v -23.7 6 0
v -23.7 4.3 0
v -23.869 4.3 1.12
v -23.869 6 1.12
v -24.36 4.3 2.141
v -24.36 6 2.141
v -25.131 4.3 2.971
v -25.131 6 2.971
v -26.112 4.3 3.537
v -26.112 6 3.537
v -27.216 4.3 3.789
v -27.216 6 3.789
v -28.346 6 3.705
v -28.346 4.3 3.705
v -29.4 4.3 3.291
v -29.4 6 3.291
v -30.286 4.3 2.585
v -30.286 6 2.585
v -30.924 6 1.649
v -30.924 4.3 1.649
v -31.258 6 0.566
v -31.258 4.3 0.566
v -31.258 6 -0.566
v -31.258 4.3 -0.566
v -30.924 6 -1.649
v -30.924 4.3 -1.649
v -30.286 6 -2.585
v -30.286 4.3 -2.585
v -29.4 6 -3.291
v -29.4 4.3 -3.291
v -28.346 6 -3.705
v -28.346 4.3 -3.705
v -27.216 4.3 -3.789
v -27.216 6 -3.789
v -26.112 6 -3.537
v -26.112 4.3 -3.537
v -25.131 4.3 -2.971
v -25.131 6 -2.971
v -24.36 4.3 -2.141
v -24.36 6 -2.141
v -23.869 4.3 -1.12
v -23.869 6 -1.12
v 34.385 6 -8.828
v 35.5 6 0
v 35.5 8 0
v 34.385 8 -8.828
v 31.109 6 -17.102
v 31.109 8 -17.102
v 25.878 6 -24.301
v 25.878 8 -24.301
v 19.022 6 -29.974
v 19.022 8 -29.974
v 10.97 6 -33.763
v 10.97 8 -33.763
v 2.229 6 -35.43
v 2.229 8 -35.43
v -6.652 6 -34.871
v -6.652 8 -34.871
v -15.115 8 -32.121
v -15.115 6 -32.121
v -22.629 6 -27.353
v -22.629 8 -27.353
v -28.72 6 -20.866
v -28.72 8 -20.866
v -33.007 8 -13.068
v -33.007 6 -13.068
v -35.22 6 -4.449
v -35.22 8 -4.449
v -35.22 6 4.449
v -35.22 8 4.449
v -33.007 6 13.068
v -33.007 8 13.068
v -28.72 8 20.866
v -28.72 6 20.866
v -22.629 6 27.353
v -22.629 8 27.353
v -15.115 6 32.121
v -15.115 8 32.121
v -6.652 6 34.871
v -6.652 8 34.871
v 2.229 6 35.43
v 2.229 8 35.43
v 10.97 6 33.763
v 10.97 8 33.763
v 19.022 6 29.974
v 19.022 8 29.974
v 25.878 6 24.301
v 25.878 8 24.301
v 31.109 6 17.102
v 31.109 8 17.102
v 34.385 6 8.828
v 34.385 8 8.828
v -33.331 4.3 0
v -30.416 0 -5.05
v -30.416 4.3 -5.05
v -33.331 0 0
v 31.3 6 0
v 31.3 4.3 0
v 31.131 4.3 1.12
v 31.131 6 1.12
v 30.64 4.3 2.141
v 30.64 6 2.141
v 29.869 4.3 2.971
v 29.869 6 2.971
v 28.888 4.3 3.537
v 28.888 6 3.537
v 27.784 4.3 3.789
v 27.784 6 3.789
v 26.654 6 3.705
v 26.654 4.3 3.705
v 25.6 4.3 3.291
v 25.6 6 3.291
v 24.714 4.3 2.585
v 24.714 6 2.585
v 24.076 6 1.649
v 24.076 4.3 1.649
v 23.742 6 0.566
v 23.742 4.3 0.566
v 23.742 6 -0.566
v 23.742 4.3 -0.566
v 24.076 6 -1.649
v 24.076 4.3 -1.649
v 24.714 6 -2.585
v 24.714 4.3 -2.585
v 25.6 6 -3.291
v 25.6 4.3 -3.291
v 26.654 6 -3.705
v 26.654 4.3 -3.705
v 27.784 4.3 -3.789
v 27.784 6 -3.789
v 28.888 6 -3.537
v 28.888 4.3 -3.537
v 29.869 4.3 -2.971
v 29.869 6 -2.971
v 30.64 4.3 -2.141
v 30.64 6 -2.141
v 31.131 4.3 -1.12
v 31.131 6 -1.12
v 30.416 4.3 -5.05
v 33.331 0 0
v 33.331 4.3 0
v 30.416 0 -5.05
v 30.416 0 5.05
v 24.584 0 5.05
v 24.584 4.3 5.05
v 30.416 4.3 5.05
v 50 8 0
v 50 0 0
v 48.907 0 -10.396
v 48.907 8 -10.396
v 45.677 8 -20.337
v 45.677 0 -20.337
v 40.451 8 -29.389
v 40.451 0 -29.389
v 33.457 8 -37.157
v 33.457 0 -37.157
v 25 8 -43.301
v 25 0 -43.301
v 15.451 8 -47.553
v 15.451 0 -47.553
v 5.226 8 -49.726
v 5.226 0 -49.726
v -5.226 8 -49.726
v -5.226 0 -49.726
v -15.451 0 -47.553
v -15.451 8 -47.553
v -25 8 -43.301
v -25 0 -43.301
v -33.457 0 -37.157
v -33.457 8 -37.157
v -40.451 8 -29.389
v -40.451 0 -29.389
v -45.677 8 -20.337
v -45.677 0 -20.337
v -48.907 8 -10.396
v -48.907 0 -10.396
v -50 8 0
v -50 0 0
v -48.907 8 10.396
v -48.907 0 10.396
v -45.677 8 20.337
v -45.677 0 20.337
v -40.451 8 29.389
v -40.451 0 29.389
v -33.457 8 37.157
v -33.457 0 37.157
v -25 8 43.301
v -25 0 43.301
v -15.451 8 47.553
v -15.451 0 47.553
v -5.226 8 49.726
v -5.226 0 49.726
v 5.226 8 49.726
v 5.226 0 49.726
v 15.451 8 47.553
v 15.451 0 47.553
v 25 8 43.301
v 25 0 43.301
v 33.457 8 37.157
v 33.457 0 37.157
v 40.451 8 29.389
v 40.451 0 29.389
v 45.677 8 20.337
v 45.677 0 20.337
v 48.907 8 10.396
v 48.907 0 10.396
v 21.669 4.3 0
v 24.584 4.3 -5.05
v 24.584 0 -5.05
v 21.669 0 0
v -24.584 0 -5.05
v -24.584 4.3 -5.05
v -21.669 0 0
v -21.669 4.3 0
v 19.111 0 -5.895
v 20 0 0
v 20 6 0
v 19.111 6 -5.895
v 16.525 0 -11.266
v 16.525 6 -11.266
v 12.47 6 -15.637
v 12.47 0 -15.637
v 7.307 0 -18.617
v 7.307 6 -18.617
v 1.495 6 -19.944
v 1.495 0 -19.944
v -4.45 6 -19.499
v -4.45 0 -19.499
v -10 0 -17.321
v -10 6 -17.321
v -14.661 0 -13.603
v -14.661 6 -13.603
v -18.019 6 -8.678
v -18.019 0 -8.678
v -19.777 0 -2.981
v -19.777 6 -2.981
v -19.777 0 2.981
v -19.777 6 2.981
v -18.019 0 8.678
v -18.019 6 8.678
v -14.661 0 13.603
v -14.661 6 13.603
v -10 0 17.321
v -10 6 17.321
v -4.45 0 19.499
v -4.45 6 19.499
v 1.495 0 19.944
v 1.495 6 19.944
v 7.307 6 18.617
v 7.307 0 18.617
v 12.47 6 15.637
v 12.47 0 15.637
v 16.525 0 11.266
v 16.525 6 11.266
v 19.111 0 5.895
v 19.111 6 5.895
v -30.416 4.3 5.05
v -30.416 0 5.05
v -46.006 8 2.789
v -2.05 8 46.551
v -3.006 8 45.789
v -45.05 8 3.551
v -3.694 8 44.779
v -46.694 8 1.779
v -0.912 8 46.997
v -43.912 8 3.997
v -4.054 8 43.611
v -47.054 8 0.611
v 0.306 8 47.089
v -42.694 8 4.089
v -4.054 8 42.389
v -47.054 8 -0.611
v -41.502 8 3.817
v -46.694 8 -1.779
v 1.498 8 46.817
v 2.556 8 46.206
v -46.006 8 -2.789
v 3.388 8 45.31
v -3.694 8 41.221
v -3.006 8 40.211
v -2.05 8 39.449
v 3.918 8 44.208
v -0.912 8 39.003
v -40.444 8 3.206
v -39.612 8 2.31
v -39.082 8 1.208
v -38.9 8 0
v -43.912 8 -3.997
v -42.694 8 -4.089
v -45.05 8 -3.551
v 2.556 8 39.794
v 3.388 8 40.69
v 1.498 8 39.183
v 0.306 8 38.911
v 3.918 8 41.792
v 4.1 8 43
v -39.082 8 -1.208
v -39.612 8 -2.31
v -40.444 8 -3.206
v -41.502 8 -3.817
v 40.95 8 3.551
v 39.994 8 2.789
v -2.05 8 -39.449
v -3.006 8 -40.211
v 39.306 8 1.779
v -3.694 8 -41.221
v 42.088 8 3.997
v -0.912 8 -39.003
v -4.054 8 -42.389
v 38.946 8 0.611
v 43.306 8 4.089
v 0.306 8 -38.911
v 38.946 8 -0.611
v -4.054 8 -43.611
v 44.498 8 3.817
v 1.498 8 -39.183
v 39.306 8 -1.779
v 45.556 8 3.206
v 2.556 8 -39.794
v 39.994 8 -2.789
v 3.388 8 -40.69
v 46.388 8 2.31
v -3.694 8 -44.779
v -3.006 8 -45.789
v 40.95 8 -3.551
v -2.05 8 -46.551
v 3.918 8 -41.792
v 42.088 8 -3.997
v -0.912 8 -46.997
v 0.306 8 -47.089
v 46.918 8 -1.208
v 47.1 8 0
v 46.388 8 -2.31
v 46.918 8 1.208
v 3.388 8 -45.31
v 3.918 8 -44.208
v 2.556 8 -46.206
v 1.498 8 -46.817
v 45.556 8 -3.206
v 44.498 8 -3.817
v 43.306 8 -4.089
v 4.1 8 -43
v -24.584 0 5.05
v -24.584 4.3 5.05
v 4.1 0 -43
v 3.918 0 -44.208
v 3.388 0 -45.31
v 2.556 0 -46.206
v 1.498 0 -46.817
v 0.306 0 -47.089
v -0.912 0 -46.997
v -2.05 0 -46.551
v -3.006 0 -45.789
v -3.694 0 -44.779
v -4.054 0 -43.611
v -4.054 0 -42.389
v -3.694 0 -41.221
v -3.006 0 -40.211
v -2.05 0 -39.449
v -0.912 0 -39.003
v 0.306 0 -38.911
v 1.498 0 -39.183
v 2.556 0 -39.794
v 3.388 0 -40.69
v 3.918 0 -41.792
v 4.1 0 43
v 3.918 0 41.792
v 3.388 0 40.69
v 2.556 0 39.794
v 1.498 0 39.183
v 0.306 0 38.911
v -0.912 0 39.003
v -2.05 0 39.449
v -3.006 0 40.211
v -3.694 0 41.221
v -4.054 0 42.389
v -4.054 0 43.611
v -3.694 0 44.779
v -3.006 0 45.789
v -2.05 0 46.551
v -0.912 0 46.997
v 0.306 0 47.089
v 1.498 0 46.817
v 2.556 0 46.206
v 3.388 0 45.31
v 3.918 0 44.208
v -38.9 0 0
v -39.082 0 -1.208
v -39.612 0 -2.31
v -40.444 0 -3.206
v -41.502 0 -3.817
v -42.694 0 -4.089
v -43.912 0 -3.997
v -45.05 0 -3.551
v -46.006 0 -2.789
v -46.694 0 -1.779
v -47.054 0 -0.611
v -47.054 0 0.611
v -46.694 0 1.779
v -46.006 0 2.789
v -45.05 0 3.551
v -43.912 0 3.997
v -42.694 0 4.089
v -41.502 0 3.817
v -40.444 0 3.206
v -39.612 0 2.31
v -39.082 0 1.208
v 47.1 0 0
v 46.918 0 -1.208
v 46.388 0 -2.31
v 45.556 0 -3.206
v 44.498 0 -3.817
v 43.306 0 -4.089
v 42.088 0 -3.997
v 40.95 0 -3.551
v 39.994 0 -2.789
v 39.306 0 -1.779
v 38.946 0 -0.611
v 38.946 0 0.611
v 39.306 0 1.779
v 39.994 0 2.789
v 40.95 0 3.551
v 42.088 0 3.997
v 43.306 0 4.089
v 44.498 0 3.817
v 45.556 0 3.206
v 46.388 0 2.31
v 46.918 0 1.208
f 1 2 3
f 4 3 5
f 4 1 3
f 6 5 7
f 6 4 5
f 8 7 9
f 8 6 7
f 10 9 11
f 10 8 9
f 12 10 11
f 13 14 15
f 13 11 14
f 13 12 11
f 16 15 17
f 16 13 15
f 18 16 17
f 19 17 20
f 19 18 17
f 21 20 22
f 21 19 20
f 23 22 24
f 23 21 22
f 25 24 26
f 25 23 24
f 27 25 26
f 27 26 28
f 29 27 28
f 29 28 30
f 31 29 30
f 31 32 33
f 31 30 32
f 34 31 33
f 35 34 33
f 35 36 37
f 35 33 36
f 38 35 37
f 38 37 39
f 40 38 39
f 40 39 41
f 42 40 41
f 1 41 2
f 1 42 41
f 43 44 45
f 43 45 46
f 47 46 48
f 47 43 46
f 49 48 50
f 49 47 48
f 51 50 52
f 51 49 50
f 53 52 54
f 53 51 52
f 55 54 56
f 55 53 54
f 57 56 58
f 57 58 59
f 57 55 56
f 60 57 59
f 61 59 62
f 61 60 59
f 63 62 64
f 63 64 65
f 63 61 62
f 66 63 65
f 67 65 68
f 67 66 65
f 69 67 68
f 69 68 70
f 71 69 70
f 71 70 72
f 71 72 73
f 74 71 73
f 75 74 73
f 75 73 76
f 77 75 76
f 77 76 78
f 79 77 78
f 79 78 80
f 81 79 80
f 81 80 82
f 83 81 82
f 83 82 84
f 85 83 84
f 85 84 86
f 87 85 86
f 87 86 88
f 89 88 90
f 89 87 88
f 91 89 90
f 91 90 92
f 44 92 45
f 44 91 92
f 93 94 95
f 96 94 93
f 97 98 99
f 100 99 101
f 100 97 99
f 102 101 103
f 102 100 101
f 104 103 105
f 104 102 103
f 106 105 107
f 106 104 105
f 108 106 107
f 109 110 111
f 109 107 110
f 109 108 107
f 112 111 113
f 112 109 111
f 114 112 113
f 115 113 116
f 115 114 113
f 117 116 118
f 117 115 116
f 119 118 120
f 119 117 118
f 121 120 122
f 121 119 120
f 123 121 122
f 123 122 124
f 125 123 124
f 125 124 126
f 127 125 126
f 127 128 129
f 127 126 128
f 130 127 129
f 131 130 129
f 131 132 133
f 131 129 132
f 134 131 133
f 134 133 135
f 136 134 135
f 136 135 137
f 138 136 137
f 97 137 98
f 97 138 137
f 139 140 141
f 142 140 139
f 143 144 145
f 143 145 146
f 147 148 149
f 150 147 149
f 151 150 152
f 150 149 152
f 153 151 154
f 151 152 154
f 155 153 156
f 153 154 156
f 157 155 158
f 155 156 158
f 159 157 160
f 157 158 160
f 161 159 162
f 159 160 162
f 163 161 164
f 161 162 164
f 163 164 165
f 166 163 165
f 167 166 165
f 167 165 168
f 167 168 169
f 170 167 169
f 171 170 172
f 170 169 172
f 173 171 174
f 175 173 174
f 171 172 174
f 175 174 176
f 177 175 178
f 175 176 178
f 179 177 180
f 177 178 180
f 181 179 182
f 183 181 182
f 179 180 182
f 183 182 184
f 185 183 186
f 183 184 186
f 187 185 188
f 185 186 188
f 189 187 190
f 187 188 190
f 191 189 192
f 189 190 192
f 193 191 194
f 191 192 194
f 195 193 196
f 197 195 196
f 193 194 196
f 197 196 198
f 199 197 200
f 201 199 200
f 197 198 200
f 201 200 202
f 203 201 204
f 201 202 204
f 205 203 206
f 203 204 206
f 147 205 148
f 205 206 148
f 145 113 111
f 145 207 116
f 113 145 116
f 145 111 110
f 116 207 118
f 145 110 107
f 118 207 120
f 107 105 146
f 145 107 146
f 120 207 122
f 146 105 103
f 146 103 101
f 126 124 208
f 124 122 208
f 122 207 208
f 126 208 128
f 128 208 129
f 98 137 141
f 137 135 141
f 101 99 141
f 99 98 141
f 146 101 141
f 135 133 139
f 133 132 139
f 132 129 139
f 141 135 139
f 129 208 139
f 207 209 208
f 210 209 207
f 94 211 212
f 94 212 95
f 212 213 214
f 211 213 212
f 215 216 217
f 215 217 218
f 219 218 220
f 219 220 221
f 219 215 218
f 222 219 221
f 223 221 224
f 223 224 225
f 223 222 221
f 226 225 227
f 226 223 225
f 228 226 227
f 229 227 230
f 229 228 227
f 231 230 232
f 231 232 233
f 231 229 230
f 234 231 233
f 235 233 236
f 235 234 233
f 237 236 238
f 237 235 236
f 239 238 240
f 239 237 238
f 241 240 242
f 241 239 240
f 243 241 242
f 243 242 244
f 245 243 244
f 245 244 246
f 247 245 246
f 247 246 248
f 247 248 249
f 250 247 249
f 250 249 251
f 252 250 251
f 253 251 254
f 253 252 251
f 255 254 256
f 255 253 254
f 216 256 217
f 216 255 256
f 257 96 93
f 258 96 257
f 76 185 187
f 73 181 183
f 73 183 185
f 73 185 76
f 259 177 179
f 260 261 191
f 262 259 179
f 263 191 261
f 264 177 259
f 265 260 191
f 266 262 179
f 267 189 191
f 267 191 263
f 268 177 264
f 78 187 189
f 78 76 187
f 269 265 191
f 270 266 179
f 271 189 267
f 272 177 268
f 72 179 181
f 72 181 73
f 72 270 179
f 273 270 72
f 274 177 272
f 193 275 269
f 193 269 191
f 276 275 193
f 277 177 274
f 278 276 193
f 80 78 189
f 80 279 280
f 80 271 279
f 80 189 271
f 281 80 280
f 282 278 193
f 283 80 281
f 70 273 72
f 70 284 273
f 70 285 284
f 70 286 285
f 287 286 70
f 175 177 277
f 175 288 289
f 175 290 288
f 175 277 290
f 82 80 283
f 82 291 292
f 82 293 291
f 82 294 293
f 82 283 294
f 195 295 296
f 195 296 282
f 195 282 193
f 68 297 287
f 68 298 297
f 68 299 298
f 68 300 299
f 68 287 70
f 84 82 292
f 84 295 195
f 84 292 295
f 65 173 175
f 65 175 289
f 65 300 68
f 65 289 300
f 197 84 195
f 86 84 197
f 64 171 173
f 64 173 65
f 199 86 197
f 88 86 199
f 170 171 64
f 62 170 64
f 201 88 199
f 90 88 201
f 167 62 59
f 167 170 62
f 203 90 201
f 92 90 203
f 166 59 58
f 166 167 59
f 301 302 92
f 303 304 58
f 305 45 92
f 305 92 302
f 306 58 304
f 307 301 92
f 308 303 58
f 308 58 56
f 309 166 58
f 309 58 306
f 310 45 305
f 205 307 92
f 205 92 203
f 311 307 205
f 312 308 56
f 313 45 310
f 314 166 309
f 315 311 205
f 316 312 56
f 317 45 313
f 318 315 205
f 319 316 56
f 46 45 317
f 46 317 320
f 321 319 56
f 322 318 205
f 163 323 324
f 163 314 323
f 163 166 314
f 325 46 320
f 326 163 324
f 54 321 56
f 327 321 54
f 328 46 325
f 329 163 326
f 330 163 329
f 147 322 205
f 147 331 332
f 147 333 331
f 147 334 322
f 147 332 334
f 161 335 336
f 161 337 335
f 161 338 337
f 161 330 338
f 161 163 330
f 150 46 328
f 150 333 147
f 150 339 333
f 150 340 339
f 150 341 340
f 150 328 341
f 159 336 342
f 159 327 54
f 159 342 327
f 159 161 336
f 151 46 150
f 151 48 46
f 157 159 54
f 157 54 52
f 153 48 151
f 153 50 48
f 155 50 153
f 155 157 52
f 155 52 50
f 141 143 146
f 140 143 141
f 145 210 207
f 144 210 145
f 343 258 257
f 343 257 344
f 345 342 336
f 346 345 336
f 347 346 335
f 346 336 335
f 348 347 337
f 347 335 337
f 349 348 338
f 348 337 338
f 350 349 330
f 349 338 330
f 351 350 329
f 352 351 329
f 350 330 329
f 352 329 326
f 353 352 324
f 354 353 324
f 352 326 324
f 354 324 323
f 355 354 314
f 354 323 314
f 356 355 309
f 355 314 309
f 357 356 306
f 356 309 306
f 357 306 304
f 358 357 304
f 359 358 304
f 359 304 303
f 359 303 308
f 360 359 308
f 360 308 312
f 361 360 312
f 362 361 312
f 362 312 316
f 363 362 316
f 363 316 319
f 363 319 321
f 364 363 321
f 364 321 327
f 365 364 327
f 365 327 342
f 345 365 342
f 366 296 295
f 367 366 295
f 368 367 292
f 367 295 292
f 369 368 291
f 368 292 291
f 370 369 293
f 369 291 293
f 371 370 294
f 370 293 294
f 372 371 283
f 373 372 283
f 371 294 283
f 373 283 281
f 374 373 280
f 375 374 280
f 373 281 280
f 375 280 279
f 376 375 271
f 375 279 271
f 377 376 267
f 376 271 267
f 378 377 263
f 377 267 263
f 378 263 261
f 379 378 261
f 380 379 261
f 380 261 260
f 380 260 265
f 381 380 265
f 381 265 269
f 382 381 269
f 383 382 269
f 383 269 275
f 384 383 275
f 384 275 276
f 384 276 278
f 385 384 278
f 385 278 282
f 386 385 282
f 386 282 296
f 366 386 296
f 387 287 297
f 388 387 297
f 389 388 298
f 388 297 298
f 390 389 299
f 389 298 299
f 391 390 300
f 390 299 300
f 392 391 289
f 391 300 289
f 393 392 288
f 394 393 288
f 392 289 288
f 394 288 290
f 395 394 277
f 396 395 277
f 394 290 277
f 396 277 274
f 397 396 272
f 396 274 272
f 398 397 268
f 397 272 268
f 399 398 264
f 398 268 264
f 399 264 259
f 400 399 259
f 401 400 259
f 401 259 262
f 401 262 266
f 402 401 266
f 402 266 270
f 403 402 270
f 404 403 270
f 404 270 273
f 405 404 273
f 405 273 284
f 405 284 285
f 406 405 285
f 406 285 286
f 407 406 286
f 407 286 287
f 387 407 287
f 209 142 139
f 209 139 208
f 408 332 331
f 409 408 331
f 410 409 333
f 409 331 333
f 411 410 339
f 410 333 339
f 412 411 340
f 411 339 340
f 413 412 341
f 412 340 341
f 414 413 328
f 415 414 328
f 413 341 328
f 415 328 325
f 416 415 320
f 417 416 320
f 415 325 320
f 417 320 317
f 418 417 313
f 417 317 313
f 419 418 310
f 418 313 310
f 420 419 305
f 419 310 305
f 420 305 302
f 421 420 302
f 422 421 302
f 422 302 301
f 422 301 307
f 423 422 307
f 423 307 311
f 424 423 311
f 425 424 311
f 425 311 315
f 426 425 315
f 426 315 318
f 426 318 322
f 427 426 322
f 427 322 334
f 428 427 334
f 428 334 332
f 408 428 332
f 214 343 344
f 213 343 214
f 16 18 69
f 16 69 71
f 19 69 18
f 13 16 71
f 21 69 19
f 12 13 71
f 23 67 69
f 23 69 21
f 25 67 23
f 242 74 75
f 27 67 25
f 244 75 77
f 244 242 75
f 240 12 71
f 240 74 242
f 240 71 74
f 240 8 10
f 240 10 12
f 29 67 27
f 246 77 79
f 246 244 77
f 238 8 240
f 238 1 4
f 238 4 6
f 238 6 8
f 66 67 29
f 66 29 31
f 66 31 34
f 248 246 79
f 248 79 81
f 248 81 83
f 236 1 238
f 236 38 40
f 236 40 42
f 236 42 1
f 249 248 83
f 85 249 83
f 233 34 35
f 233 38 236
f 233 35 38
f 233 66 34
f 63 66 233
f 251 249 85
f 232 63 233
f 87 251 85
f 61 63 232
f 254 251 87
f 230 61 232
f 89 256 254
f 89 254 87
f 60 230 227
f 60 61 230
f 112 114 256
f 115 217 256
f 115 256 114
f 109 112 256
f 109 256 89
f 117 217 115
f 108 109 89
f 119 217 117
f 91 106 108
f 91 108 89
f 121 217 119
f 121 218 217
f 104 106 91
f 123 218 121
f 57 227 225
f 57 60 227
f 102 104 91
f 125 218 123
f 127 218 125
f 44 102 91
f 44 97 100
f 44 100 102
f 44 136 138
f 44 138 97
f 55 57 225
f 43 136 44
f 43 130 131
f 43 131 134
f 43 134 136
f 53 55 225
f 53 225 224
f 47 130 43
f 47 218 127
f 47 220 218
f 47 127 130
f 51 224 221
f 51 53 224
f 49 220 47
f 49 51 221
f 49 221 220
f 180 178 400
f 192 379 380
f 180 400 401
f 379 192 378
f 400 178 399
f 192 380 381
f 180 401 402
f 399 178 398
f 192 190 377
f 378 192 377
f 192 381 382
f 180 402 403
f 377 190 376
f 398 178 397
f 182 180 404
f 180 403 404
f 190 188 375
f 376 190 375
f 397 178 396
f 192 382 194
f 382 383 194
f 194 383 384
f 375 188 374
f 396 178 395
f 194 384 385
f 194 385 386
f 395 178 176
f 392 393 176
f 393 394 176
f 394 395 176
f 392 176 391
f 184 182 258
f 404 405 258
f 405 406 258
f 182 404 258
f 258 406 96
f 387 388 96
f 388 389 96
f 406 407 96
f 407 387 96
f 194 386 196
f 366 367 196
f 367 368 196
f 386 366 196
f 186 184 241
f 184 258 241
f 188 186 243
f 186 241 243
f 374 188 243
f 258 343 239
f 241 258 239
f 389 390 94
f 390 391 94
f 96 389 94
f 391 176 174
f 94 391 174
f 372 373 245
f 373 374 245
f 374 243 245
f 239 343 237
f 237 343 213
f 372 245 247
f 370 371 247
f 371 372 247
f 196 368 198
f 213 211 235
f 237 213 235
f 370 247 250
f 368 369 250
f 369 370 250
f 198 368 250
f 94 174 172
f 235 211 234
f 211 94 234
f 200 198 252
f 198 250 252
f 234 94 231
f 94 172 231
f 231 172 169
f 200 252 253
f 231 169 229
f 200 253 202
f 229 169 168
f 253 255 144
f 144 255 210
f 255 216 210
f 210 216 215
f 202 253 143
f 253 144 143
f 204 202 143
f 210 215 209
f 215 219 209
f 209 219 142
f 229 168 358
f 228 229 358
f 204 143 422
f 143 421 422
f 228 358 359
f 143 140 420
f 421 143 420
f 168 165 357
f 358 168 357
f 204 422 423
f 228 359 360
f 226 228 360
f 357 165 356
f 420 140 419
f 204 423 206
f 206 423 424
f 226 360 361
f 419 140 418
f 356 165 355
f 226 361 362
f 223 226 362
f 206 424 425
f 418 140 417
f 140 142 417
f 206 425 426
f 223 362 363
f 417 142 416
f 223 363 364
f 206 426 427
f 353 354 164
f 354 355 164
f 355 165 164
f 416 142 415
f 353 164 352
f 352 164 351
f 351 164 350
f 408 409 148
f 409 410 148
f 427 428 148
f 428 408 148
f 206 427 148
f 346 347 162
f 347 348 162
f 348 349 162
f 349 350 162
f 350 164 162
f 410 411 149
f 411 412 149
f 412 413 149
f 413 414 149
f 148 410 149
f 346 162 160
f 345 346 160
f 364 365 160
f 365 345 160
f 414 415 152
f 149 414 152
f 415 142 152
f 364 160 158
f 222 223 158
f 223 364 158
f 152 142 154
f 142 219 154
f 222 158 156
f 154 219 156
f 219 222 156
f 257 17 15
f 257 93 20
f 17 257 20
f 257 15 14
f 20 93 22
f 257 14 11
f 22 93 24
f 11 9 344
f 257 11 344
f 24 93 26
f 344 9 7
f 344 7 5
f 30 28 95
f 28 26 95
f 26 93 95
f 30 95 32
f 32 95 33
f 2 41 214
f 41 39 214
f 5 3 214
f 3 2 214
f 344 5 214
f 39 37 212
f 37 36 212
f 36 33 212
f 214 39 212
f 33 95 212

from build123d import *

# Parameters (mm, degrees)
SKETCH1_R               = 50
SKETCH1_R_2             = 35.5
BOSS_EXTRUDE1_DEPTH     = 8
SKETCH2_R               = 4.1
CUT_EXTRUDE1_DEPTH      = 1
CUT_EXTRUDE1_DEPTH_BACK = 9
SKETCH3_R               = 35.5
SKETCH3_R_2             = 20
BOSS_EXTRUDE2_DEPTH     = 6
CUT_EXTRUDE2_START      = -6
CUT_EXTRUDE2_DEPTH      = 4.3
SKETCH5_R               = 3.8
CUT_EXTRUDE3_DEPTH      = 7
CUT_EXTRUDE3_DEPTH_BACK = 3


with BuildPart() as part:
    # Sketch1 → Boss-Extrude1 (new body)
    with BuildSketch(Plane(origin=(0, 0, 0), x_dir=(1, 0, 0), z_dir=(0, 1, 0))):
        Circle(SKETCH1_R)
        Circle(SKETCH1_R_2, mode=Mode.SUBTRACT)
    extrude(amount=BOSS_EXTRUDE1_DEPTH)

    # Sketch2 → Cut-Extrude1 (cut, two sides)
    with BuildSketch(Plane(origin=(0, 8, 0), x_dir=(1, 0, 0), z_dir=(0, 1, 0))) as cut_extrude1_sk:
        with Locations((0, -43)):
            Circle(SKETCH2_R)
        with Locations((-43, 0)):
            Circle(SKETCH2_R)
        with Locations((0, 43)):
            Circle(SKETCH2_R)
        with Locations((43, 0)):
            Circle(SKETCH2_R)
    extrude(amount=CUT_EXTRUDE1_DEPTH, mode=Mode.SUBTRACT)
    extrude(cut_extrude1_sk.sketch, amount=-CUT_EXTRUDE1_DEPTH_BACK, mode=Mode.SUBTRACT)

    # Sketch3 → Boss-Extrude2 (add)
    with BuildSketch(Plane(origin=(0, 0, 0), x_dir=(1, 0, 0), z_dir=(0, 1, 0))):
        Circle(SKETCH3_R)
        Circle(SKETCH3_R_2, mode=Mode.SUBTRACT)
    extrude(amount=BOSS_EXTRUDE2_DEPTH)

    # Sketch4 → Cut-Extrude2 (cut)
    with BuildSketch(Plane(origin=(0, 6, 0), x_dir=(1, 0, 0), z_dir=(0, 1, 0)).offset(CUT_EXTRUDE2_START)):
        Polygon((-21.668762281, 0), (-24.584381141, 5.05), (-30.415618859, 5.05), (-33.331237719, 0), (-30.415618859, -5.05), (-24.584381141, -5.05), align=None)
        Polygon((33.331237719, 0), (30.415618859, 5.05), (24.584381141, 5.05), (21.668762281, 0), (24.584381141, -5.05), (30.415618859, -5.05), align=None)
    extrude(amount=CUT_EXTRUDE2_DEPTH, mode=Mode.SUBTRACT)

    # Sketch5 → Cut-Extrude3 (cut, two sides)
    with BuildSketch(Plane(origin=(0, 6, -6), x_dir=(1, 0, 0), z_dir=(0, -1, 0))) as cut_extrude3_sk:
        with Locations((-27.5, 6)):
            Circle(SKETCH5_R)
        with Locations((27.5, 6)):
            Circle(SKETCH5_R)
    extrude(amount=CUT_EXTRUDE3_DEPTH, mode=Mode.SUBTRACT)
    extrude(cut_extrude3_sk.sketch, amount=-CUT_EXTRUDE3_DEPTH_BACK, mode=Mode.SUBTRACT)


solid = part.part
